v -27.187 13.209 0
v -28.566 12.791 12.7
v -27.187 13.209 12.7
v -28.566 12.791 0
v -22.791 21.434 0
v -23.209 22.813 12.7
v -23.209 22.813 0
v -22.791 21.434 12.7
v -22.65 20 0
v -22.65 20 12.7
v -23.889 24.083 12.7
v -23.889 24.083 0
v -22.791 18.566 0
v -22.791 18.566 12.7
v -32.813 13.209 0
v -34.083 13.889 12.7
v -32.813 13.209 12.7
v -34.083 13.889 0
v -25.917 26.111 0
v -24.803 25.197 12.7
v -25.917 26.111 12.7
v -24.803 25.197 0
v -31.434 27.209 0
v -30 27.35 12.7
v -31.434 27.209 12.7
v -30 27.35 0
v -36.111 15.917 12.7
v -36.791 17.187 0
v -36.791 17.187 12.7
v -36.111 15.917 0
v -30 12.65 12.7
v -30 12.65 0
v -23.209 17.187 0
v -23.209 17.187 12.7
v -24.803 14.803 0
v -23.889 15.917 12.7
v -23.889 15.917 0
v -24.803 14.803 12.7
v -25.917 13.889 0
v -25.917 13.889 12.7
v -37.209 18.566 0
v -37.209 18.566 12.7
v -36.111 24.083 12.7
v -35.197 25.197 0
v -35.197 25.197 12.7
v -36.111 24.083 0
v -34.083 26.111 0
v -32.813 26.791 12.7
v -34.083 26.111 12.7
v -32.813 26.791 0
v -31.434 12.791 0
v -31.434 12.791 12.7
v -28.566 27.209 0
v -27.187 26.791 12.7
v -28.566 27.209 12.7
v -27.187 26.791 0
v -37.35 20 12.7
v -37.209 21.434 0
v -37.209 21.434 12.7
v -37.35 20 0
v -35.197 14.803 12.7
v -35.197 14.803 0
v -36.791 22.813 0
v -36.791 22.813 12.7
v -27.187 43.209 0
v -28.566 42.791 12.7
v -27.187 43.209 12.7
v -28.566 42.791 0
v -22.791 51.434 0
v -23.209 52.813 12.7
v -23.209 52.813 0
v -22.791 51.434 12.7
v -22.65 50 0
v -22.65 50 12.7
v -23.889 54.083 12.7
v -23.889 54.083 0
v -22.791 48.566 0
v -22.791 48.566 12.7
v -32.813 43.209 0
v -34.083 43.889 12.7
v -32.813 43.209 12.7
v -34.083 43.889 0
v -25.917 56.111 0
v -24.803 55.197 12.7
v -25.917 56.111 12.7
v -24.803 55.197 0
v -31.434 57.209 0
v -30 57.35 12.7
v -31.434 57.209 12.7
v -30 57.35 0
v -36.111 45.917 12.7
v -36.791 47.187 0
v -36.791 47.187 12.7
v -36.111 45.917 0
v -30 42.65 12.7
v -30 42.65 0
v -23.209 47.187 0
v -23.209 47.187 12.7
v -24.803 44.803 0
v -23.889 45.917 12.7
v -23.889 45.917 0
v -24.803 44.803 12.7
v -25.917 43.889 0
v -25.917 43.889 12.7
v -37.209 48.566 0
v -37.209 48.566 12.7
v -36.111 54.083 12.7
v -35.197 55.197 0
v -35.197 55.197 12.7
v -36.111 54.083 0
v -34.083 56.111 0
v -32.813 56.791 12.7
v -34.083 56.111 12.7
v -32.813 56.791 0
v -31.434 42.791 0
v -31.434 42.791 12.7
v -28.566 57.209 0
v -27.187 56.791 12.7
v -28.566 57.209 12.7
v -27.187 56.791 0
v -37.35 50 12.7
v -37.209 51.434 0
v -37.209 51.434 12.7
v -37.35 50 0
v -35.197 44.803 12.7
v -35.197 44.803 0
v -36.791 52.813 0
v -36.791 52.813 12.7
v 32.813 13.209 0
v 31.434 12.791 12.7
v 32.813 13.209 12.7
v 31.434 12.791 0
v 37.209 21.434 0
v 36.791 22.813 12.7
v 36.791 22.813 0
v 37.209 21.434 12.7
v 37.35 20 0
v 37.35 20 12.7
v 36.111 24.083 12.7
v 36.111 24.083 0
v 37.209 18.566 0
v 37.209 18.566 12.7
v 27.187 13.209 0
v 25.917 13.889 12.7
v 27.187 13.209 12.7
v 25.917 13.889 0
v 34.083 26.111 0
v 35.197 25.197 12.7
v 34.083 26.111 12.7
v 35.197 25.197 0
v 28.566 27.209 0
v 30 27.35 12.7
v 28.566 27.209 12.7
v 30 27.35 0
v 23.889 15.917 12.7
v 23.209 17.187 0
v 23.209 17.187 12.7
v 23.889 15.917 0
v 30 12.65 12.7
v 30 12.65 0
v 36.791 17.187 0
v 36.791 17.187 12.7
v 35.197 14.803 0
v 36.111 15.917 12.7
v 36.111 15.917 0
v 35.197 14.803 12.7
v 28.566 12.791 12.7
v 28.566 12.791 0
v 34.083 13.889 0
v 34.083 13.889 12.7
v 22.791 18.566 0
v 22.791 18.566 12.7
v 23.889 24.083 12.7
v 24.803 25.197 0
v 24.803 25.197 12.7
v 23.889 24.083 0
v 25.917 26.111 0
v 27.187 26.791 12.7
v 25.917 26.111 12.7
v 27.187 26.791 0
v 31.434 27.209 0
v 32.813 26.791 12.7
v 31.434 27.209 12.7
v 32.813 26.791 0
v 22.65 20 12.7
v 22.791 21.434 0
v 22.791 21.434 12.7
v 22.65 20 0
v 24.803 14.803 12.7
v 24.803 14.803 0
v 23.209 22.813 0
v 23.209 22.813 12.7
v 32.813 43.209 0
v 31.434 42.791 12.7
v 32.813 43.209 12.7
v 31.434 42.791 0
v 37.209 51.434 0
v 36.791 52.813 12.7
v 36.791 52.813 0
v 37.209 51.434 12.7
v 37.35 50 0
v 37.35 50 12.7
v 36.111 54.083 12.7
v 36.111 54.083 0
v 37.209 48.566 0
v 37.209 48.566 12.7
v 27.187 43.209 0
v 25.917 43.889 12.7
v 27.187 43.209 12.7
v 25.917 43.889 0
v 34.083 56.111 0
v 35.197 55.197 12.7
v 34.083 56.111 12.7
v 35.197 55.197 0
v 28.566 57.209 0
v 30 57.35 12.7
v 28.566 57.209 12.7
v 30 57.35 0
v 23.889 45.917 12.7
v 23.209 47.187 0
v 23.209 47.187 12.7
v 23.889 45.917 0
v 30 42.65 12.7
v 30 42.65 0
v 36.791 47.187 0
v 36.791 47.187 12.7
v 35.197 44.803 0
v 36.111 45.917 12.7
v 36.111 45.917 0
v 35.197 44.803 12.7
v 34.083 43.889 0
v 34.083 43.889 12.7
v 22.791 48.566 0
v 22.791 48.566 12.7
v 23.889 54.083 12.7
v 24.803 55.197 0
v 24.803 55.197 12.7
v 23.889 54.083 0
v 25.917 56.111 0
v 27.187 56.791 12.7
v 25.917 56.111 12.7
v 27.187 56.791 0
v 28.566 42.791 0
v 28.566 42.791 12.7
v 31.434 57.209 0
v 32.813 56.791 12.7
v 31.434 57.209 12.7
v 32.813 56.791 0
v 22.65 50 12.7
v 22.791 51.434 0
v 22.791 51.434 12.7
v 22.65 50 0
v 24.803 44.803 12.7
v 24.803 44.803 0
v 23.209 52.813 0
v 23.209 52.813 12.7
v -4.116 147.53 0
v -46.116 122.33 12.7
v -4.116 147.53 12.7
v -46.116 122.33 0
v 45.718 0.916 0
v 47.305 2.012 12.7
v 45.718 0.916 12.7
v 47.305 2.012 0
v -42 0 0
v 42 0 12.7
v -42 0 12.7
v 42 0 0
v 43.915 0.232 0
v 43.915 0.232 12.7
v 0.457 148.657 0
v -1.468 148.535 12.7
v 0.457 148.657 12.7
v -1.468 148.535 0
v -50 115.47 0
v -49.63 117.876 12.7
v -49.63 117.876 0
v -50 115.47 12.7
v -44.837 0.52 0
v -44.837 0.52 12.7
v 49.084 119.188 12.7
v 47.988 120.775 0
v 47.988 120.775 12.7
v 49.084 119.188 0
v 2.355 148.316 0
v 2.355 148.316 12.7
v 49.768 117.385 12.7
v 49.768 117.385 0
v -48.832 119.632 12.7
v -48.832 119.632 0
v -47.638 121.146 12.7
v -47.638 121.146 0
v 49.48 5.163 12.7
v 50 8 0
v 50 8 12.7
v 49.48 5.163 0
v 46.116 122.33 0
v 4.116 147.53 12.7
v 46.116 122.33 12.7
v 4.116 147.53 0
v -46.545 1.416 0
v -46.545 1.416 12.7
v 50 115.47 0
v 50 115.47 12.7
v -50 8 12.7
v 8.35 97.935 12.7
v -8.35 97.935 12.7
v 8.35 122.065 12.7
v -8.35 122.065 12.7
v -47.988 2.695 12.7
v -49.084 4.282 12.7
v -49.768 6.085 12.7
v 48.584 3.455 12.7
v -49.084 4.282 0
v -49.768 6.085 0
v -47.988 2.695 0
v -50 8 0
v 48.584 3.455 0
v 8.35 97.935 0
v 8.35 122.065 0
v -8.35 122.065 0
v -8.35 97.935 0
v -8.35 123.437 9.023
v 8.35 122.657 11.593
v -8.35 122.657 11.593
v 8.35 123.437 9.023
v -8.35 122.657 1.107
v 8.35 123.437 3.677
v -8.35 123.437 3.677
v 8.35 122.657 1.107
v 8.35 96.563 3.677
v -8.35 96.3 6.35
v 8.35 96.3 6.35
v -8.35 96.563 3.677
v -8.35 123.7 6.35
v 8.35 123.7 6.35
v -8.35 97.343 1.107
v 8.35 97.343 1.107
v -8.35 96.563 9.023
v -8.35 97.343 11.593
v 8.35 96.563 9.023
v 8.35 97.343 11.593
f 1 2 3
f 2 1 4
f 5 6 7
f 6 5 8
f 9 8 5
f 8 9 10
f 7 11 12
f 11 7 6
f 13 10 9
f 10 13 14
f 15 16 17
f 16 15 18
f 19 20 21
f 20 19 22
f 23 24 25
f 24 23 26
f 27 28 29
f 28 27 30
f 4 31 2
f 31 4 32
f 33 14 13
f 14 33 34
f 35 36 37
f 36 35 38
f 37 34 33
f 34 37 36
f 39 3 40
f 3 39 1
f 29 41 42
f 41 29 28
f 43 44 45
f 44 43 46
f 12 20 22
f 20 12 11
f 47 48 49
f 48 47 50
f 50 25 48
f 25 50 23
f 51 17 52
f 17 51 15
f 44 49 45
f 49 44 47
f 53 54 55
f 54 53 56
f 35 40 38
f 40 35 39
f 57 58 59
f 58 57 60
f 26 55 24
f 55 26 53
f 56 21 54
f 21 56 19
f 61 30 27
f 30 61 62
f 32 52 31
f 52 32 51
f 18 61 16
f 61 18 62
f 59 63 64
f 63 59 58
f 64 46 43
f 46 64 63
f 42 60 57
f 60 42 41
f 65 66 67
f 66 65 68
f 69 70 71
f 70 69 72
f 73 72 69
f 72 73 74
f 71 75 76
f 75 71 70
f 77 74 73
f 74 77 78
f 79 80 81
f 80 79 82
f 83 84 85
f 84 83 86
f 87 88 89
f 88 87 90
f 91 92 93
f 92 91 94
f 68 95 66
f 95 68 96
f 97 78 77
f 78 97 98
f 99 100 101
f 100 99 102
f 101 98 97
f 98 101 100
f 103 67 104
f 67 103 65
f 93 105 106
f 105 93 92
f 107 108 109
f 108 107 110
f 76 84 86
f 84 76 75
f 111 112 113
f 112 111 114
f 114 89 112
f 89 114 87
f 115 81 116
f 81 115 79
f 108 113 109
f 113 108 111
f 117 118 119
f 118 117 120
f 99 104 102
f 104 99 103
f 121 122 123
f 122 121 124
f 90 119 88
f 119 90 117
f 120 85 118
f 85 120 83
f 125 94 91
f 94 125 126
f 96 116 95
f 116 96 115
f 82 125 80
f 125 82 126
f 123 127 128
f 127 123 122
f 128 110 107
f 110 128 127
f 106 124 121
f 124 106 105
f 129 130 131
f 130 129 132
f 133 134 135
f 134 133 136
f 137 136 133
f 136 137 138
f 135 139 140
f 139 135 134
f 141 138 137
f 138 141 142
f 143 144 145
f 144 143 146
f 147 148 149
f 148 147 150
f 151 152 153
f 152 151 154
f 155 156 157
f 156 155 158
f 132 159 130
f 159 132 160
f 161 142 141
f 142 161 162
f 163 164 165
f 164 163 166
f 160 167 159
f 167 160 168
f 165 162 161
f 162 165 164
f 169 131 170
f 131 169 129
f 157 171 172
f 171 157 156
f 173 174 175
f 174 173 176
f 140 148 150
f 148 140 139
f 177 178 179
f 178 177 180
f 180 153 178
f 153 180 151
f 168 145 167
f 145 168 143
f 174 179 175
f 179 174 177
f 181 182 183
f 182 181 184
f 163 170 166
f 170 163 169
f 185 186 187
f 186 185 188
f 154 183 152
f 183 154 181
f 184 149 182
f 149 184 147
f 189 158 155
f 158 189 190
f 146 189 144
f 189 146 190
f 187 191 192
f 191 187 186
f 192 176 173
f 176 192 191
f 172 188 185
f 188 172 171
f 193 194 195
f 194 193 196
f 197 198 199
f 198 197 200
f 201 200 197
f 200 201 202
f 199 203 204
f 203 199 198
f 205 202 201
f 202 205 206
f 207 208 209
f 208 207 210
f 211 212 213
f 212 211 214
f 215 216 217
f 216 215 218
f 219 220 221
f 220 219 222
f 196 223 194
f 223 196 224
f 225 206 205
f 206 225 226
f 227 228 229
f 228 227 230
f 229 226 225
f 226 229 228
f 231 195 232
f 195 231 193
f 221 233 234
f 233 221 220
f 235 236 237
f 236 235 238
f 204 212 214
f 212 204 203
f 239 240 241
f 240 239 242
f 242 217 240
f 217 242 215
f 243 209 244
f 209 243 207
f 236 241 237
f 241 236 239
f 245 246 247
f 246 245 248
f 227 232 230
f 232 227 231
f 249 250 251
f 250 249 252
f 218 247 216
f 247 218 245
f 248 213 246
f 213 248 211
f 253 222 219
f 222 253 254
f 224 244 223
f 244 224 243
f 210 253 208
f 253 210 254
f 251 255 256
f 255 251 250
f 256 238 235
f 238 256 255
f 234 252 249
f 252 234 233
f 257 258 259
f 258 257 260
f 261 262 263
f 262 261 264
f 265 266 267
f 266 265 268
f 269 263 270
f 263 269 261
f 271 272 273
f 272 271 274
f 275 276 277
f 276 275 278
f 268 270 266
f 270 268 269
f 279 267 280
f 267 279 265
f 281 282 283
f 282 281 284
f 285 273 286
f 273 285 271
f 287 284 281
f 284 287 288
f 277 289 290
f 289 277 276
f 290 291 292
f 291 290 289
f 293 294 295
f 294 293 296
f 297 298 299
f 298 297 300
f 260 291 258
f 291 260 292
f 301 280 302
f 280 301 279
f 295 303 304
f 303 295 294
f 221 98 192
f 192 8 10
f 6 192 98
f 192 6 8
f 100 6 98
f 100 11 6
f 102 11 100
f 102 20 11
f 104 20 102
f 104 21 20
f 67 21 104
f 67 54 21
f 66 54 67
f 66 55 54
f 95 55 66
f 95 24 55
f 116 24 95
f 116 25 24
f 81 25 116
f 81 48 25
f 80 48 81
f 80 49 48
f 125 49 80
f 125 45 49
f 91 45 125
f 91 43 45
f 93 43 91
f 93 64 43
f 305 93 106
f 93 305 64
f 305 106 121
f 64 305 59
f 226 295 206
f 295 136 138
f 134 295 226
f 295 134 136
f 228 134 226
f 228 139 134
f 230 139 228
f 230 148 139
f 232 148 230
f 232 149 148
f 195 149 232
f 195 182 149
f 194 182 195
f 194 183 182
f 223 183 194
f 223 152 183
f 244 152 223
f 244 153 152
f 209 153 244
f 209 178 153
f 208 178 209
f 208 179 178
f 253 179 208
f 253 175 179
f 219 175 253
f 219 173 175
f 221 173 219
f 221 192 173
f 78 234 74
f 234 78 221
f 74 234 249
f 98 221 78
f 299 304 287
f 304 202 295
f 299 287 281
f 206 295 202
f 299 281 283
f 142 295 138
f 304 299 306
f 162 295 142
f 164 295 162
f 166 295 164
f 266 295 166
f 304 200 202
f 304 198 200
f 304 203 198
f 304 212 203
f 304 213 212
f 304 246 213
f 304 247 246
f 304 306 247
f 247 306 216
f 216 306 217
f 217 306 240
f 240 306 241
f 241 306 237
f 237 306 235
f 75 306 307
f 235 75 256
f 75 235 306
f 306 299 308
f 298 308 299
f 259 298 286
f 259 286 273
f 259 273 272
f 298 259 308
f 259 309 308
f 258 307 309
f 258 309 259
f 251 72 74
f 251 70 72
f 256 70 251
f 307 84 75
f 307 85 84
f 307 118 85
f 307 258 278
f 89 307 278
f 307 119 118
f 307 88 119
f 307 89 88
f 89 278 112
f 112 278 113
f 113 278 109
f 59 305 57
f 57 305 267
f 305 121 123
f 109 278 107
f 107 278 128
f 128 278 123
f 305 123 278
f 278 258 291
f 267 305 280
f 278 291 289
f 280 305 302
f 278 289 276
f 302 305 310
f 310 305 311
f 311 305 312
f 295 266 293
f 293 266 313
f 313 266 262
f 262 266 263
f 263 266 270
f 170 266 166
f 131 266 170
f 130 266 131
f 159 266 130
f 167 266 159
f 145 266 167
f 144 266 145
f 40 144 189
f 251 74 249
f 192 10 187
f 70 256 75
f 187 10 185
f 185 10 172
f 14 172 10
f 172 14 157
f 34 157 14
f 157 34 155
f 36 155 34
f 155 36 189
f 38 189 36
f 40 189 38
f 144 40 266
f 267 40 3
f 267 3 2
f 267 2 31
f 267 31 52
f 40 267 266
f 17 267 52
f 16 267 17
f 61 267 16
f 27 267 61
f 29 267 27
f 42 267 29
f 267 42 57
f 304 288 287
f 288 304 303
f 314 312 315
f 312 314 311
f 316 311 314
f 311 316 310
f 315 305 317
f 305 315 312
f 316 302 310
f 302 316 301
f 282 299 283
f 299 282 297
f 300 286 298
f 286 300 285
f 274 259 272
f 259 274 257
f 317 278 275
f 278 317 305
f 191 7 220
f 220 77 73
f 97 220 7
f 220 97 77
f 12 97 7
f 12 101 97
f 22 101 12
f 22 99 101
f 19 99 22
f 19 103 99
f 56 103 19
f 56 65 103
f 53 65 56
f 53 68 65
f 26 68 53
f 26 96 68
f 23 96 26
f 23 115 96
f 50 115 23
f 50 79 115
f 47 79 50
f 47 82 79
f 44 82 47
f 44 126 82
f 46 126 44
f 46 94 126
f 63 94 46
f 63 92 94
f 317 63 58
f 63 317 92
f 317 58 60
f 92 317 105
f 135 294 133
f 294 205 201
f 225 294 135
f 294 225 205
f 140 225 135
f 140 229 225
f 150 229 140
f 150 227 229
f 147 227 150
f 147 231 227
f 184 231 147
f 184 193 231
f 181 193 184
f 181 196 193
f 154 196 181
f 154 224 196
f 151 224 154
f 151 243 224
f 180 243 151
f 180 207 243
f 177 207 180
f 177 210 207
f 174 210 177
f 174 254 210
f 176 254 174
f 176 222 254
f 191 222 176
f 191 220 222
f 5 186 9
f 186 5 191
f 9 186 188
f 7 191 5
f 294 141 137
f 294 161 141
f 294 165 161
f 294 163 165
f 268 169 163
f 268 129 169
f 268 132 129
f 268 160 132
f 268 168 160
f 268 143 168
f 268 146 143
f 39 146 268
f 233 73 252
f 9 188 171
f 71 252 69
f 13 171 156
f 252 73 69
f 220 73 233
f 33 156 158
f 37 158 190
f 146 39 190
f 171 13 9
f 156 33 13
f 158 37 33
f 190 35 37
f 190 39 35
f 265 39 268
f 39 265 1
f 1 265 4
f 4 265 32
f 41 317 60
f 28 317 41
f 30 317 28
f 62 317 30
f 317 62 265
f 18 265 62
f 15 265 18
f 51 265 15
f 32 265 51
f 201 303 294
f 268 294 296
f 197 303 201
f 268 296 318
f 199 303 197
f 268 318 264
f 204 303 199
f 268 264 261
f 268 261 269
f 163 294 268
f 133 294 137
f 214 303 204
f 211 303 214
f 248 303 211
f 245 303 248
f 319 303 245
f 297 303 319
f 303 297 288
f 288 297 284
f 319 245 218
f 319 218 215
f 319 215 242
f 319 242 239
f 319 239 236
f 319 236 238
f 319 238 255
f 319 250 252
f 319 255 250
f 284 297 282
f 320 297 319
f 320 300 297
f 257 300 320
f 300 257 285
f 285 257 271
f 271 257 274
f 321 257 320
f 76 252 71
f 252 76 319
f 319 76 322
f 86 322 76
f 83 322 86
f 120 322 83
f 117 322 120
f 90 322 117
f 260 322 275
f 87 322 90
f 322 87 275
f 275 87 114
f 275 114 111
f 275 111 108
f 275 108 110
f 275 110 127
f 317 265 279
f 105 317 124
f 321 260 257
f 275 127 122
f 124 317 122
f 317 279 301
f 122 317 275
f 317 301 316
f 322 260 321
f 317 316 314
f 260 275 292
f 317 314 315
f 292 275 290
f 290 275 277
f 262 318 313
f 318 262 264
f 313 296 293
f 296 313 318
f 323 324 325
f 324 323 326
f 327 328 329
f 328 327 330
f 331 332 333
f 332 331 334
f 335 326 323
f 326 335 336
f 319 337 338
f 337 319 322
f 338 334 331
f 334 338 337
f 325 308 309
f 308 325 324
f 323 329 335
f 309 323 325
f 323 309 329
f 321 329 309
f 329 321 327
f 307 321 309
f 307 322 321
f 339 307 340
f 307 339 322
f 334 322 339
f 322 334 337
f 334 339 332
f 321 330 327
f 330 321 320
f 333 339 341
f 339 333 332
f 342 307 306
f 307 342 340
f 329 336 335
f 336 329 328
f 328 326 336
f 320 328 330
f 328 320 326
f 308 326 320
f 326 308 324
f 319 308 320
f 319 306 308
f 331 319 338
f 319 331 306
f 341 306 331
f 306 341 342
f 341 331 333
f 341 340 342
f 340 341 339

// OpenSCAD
// cylinder_lug.scad
// Hydraulic cylinder mounting lug for LifeTrac v25
// CNC cut from 1/2" plate steel with center pivot hole

include <../openscad/lifetrac_v25_params.scad>

module cylinder_lug() {
    lug_width = 100;
    lug_height = 150;
    
    difference() {
        // Main lug plate with rounded top
        linear_extrude(height=PLATE_1_2_INCH)
        offset(r=8) offset(r=-8)  // Rounded corners
        polygon([
            [-lug_width/2, 0],
            [lug_width/2, 0],
            [lug_width/2, lug_height - 30],
            [0, lug_height],
            [-lug_width/2, lug_height - 30]
        ]);
        
        // Center pivot hole for cylinder pin
        translate([0, lug_height - 40, PLATE_1_2_INCH/2])
        rotate([0, 90, 0])
        cylinder(d=BOLT_DIA_1 + 2, h=PLATE_1_2_INCH+4, center=true, $fn=32);
        
        // Base mounting holes (4 holes)
        for (x = [-lug_width/2 + 20, lug_width/2 - 20]) {
            for (y = [20, 50]) {
                translate([x, y, PLATE_1_2_INCH/2])
                cylinder(d=BOLT_DIA_1_2 + 2, h=PLATE_1_2_INCH+4, center=true, $fn=32);
            }
        }
    }
}

// Render the part for preview/export
if ($preview || len(search("cylinder_lug.scad", parent_modules())) == 0) {
    cylinder_lug();
}
